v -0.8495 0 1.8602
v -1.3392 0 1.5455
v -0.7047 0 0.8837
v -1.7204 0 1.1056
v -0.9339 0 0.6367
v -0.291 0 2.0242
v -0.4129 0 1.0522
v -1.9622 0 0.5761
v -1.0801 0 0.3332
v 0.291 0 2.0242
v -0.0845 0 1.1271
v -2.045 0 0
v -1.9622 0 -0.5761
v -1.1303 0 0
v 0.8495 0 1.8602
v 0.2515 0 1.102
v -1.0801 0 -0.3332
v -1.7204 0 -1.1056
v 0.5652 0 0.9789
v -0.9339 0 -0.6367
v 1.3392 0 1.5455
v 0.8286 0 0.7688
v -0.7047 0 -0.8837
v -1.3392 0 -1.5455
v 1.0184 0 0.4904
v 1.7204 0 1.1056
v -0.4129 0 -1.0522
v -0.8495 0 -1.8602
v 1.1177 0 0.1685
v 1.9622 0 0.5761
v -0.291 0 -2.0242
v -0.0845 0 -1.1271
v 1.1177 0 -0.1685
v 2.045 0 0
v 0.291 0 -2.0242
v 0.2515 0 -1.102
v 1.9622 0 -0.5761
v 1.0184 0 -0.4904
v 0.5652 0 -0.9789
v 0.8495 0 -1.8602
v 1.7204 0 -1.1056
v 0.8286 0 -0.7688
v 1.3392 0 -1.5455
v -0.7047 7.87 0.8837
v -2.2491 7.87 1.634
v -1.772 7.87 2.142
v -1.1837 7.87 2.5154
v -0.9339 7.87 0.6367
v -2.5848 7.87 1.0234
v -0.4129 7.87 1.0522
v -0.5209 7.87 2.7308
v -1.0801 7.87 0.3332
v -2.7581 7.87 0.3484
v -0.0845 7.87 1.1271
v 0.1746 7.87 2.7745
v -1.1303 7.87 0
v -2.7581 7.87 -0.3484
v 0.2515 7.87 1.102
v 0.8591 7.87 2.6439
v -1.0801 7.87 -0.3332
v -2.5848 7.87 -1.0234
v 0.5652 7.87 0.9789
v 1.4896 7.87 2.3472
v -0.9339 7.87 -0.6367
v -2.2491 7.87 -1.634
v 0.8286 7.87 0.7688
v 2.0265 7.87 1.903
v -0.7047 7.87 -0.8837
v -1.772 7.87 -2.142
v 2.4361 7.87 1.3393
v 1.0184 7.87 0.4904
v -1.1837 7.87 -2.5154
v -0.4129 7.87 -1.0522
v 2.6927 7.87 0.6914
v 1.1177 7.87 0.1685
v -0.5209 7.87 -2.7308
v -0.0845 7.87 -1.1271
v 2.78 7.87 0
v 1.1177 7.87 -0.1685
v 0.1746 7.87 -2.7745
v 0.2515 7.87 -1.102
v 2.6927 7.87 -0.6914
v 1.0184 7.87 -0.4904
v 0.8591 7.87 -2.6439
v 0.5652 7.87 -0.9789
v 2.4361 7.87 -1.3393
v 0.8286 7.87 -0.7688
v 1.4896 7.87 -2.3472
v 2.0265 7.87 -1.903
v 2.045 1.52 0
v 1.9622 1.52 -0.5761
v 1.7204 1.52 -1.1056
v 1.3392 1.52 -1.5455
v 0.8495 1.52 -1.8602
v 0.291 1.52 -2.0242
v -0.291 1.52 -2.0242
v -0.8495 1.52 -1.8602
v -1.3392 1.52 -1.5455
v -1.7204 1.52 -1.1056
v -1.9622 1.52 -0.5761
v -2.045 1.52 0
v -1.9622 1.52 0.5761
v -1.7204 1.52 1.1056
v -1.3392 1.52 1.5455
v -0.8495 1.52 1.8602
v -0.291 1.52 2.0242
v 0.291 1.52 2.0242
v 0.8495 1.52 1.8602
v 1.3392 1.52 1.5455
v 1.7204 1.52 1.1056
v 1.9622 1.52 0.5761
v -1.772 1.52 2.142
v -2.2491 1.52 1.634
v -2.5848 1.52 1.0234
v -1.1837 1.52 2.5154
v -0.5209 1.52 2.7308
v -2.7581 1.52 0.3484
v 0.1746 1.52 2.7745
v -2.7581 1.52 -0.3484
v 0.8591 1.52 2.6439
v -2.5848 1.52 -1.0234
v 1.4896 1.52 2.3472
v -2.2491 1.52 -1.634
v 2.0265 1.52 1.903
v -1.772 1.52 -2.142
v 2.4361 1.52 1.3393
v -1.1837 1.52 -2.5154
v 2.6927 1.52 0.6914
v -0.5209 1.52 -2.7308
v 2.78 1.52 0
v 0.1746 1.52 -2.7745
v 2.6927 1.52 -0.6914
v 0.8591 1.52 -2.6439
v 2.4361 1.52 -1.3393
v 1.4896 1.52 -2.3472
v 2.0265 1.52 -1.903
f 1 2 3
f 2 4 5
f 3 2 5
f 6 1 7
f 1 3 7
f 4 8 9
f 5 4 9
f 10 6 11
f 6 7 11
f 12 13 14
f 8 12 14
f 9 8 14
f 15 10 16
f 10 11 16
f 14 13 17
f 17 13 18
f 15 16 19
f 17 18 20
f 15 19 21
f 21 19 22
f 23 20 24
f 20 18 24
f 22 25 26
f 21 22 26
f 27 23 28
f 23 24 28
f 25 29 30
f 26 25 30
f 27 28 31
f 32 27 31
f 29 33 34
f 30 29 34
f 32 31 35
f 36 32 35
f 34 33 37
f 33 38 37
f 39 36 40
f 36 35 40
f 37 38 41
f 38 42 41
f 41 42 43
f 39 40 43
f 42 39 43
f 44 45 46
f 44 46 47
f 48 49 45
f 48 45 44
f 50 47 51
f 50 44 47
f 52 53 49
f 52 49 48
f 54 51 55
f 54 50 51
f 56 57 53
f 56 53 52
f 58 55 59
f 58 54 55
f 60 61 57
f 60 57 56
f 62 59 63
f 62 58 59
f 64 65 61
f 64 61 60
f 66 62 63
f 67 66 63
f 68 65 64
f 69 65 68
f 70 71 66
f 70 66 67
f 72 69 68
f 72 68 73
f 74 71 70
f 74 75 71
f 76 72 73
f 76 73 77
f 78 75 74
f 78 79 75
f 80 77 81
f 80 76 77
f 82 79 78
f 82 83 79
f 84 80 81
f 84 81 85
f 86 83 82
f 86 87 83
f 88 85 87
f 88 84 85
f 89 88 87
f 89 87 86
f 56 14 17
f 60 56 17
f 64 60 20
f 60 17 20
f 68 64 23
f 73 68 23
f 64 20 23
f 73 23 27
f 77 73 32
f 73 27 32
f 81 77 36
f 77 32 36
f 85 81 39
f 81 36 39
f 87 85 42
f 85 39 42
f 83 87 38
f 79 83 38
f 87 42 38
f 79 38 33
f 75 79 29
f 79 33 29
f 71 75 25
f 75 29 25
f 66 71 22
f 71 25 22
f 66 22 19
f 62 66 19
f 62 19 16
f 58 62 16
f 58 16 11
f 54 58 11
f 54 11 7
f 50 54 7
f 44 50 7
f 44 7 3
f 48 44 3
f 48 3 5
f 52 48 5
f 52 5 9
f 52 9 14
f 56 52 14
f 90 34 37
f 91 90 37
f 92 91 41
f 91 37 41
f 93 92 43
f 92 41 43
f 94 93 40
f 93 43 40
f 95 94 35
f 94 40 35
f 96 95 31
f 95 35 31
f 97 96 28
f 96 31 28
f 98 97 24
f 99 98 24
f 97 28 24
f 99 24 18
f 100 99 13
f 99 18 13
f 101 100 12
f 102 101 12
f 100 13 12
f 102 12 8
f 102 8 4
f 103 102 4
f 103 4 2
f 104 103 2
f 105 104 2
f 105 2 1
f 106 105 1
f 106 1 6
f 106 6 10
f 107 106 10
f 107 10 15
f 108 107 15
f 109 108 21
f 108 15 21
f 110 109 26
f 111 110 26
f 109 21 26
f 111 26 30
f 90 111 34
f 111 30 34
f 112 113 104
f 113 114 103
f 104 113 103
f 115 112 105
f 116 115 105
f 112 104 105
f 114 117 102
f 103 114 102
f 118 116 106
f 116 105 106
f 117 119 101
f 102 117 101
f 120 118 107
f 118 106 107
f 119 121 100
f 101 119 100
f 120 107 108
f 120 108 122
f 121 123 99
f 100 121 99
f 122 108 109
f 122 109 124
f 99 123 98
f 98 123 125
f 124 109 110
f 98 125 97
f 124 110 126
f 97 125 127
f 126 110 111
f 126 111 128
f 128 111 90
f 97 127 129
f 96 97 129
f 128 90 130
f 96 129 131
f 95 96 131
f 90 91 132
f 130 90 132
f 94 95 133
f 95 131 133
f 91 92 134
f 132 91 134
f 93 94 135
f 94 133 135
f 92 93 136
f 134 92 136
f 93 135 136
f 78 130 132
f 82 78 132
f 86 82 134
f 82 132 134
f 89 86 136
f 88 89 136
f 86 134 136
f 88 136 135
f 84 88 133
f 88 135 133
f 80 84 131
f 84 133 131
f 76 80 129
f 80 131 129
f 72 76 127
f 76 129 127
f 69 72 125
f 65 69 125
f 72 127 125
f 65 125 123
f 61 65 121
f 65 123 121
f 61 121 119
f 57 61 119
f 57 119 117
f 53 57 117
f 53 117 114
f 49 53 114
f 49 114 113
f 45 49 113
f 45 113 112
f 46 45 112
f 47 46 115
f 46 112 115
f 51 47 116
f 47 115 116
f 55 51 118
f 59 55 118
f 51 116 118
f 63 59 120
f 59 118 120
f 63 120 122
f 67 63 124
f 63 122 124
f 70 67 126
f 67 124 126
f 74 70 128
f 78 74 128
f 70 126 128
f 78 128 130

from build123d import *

# Parameters (mm, degrees)
SKETCH1_R             = 2.045
BOSS_EXTRUDE1_DEPTH   = 1.52
SKETCH2_R             = 2.78
BOSS_EXTRUDE2_DEPTH   = 6.35
F_4_40_TAPPED_HOLE1_D = 2.2606


with BuildPart() as part:
    # Sketch1 → Boss-Extrude1 (new body)
    with BuildSketch(Plane(origin=(0, 0, 0), x_dir=(1, 0, 0), z_dir=(0, 1, 0))):
        Circle(SKETCH1_R)
    extrude(amount=BOSS_EXTRUDE1_DEPTH)

    # Sketch2 → Boss-Extrude2 (add)
    with BuildSketch(Plane(origin=(0, 1.52, 0), x_dir=(1, 0, 0), z_dir=(0, 1, 0))):
        Circle(SKETCH2_R)
    extrude(amount=BOSS_EXTRUDE2_DEPTH)

    # #4-40 Tapped Hole1 (through all)
    with Locations(Plane(origin=(0, 7.87, 0), x_dir=(1, 0, 0), z_dir=(0, 1, 0))):
        with Locations((0, 0)):
            Hole(F_4_40_TAPPED_HOLE1_D / 2)


solid = part.part
